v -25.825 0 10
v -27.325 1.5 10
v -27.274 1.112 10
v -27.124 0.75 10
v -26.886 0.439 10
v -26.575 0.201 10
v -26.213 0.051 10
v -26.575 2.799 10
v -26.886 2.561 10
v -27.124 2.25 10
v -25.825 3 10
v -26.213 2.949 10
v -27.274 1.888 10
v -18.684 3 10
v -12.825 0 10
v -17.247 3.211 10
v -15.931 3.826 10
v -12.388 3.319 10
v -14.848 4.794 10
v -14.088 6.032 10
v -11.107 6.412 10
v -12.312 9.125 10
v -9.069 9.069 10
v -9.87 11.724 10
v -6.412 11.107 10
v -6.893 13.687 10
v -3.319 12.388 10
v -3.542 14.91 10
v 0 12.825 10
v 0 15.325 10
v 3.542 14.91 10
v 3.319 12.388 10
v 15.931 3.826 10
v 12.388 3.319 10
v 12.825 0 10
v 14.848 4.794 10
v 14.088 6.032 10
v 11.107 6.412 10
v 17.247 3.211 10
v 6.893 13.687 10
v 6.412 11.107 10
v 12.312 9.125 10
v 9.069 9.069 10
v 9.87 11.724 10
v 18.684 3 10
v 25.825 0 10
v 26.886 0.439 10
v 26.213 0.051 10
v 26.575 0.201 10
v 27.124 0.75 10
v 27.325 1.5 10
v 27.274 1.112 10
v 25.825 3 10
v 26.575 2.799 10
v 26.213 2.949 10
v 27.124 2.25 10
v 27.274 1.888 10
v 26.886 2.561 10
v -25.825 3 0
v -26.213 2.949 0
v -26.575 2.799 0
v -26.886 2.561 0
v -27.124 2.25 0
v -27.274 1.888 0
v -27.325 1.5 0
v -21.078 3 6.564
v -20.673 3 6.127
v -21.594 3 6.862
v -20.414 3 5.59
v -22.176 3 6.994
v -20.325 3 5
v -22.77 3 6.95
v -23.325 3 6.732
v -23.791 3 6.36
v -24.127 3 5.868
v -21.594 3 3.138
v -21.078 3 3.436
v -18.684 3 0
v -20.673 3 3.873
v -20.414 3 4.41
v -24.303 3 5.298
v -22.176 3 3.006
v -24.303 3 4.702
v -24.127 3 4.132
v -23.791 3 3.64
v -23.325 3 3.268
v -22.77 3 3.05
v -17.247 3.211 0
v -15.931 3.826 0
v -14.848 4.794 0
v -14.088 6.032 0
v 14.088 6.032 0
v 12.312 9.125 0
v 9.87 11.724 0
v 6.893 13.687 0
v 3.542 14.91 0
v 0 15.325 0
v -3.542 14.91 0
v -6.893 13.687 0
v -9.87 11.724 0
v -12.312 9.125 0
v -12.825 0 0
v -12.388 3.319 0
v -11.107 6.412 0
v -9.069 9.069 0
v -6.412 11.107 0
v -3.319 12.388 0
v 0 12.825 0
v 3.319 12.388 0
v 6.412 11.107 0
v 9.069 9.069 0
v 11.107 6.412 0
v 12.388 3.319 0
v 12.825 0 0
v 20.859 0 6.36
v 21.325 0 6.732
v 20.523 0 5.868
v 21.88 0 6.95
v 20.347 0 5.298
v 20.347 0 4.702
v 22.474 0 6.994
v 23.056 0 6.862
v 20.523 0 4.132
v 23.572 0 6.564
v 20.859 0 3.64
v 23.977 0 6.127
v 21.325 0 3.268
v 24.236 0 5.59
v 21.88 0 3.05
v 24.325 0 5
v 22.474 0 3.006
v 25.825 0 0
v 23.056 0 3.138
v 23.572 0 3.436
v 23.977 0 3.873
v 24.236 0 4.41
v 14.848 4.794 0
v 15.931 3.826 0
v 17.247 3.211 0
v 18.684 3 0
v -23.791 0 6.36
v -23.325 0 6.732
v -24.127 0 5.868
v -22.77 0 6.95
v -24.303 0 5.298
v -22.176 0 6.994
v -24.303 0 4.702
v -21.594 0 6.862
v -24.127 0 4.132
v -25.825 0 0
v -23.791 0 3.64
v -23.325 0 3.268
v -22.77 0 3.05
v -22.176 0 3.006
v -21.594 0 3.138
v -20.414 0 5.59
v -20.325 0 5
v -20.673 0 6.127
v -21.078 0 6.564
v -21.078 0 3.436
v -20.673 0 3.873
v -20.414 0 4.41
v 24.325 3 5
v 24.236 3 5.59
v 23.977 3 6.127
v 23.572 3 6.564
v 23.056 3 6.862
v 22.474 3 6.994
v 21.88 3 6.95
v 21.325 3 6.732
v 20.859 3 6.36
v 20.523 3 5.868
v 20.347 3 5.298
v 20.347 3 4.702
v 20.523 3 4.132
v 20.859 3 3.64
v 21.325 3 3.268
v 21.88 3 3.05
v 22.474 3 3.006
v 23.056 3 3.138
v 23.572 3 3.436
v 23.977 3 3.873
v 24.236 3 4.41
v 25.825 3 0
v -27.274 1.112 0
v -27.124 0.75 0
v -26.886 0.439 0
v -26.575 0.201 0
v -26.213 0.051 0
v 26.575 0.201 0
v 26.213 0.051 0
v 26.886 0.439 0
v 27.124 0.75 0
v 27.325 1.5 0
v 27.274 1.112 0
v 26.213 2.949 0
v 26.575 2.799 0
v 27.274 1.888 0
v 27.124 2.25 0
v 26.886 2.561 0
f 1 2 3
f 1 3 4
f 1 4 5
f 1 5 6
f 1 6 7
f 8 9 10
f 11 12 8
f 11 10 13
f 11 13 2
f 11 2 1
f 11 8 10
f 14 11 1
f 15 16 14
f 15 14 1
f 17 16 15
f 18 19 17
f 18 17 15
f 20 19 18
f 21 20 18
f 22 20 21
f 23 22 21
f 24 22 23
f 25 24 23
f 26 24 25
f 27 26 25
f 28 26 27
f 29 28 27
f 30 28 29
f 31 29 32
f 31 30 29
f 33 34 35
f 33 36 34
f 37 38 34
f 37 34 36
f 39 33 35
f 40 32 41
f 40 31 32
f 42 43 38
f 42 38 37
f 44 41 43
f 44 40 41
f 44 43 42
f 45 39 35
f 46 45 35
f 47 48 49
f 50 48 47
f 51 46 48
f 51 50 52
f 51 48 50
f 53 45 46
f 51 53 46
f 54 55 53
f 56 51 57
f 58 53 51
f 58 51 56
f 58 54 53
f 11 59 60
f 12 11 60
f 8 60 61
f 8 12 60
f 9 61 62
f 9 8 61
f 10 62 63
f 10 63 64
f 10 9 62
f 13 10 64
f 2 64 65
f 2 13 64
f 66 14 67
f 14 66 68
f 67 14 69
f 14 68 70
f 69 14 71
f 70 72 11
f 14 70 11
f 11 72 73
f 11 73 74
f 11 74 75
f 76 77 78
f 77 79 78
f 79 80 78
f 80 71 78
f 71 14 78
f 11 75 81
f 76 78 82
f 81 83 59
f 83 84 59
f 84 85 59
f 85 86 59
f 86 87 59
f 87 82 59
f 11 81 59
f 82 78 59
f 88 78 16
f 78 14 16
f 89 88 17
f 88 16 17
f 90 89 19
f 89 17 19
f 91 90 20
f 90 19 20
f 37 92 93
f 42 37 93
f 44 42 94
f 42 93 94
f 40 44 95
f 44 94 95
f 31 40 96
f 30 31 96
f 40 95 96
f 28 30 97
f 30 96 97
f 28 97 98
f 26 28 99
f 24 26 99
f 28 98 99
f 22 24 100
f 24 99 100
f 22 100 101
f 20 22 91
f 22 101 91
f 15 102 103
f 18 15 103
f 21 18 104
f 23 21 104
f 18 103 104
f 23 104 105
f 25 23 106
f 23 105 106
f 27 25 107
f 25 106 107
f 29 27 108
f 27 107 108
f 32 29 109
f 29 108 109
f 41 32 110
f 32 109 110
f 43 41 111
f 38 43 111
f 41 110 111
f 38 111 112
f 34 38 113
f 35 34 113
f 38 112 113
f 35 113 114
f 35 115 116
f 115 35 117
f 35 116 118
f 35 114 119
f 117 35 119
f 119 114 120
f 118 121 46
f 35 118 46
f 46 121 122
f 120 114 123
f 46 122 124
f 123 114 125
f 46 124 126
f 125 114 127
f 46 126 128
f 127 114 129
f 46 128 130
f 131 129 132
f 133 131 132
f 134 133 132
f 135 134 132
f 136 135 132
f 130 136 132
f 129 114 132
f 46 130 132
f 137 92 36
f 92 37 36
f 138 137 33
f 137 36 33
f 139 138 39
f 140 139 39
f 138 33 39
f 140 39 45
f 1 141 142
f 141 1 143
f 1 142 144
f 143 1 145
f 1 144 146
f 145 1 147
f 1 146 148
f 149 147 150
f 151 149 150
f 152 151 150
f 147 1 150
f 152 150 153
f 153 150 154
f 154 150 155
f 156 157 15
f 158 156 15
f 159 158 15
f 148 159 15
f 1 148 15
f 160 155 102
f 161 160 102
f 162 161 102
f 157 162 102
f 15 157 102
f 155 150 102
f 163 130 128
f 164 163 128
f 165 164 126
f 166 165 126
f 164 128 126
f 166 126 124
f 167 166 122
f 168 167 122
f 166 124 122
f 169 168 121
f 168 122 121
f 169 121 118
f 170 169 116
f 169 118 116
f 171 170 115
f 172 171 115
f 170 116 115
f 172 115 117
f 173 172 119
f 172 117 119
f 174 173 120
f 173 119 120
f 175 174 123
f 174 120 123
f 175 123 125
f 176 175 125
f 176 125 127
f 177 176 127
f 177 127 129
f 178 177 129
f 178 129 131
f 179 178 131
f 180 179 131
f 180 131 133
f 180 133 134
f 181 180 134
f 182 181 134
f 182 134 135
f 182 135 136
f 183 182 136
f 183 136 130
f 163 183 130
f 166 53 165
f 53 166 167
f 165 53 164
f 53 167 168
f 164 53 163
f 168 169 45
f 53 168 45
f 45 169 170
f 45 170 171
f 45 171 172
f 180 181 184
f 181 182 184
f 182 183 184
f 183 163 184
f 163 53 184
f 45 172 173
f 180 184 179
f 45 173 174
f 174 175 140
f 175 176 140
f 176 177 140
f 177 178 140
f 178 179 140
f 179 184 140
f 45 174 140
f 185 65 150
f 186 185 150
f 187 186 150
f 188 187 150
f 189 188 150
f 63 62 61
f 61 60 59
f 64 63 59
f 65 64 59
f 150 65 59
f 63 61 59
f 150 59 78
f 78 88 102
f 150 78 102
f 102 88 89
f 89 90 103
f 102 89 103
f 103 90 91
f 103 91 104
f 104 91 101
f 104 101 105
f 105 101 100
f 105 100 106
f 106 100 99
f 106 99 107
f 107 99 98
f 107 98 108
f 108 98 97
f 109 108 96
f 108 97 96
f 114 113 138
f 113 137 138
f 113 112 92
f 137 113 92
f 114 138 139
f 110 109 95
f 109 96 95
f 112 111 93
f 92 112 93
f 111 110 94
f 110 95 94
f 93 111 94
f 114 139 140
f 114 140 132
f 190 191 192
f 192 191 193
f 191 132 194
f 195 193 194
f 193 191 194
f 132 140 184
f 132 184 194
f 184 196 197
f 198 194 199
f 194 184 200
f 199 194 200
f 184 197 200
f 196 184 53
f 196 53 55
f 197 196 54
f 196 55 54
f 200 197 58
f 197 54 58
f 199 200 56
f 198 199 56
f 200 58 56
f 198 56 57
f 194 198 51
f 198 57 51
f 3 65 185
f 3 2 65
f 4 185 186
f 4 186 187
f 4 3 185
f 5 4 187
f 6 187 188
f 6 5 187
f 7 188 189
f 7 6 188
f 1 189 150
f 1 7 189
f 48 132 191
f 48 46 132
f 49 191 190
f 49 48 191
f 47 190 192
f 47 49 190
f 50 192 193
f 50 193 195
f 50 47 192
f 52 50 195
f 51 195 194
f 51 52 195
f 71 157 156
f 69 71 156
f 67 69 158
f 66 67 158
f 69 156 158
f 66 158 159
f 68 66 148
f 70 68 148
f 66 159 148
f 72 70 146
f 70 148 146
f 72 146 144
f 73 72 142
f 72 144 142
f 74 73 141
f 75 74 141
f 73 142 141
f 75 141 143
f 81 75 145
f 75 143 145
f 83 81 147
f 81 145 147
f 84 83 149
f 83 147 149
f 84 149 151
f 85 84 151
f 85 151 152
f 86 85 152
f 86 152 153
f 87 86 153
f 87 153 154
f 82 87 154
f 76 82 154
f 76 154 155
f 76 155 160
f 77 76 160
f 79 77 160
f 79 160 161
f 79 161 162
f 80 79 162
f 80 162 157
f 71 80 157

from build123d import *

# Parameters (mm, degrees)
F1_DEPTH = 10
F2_R     = 2
F3_DEPTH = 15.326
F4_R     = 5
F5_R     = 1.49999


# Not quite as in the source:
# - a fillet or chamfer is up to 0.001 mm smaller than in the source, because OpenCascade refuses the exact size


with BuildPart() as f1:
    # F0 (on Top) → F1 (new body)
    with BuildSketch(Plane.XY):
        with BuildLine():
            Line((-15.0284937702, 3), (-27.325, 3))
            Line((-27.325, 3), (-27.325, 0))
            Line((-27.325, 0), (-12.825, 0))
            ThreePointArc((-12.825, 0), (0, 12.825), (12.825, 0))
            Line((12.825, 0), (27.325, 0))
            Line((27.325, 0), (27.325, 3))
            Line((27.325, 3), (15.0284937702, 3))
            ThreePointArc((15.0284937702, 3), (0, 15.325), (-15.0284937702, 3))
        make_face()
    extrude(amount=F1_DEPTH)

    # F2 (on face) → F3 (cut, through all)
    with BuildSketch(Plane.XZ):
        with Locations((-22.325, 5)):
            Circle(F2_R)
        with Locations((22.325, 5)):
            Circle(F2_R)
    extrude(amount=-F3_DEPTH, mode=Mode.SUBTRACT)

    # F4
    f4_edges = [f1.edges().sort_by_distance(p)[0] for p in [
        (-15.028494, 3, 5),
        (15.028494, 3, 5),
    ]]
    fillet(f4_edges, radius=F4_R)

    # F5 (radius 1.5 in the source; OpenCascade refuses exactly that, so slightly less here)
    f5_edges = [f1.edges().sort_by_distance(p)[0] for p in [
        (-27.325, 0, 5),
        (-27.325, 3, 5),
        (27.325, 0, 5),
        (27.325, 3, 5),
    ]]
    fillet(f5_edges, radius=F5_R)


solid = f1.part
